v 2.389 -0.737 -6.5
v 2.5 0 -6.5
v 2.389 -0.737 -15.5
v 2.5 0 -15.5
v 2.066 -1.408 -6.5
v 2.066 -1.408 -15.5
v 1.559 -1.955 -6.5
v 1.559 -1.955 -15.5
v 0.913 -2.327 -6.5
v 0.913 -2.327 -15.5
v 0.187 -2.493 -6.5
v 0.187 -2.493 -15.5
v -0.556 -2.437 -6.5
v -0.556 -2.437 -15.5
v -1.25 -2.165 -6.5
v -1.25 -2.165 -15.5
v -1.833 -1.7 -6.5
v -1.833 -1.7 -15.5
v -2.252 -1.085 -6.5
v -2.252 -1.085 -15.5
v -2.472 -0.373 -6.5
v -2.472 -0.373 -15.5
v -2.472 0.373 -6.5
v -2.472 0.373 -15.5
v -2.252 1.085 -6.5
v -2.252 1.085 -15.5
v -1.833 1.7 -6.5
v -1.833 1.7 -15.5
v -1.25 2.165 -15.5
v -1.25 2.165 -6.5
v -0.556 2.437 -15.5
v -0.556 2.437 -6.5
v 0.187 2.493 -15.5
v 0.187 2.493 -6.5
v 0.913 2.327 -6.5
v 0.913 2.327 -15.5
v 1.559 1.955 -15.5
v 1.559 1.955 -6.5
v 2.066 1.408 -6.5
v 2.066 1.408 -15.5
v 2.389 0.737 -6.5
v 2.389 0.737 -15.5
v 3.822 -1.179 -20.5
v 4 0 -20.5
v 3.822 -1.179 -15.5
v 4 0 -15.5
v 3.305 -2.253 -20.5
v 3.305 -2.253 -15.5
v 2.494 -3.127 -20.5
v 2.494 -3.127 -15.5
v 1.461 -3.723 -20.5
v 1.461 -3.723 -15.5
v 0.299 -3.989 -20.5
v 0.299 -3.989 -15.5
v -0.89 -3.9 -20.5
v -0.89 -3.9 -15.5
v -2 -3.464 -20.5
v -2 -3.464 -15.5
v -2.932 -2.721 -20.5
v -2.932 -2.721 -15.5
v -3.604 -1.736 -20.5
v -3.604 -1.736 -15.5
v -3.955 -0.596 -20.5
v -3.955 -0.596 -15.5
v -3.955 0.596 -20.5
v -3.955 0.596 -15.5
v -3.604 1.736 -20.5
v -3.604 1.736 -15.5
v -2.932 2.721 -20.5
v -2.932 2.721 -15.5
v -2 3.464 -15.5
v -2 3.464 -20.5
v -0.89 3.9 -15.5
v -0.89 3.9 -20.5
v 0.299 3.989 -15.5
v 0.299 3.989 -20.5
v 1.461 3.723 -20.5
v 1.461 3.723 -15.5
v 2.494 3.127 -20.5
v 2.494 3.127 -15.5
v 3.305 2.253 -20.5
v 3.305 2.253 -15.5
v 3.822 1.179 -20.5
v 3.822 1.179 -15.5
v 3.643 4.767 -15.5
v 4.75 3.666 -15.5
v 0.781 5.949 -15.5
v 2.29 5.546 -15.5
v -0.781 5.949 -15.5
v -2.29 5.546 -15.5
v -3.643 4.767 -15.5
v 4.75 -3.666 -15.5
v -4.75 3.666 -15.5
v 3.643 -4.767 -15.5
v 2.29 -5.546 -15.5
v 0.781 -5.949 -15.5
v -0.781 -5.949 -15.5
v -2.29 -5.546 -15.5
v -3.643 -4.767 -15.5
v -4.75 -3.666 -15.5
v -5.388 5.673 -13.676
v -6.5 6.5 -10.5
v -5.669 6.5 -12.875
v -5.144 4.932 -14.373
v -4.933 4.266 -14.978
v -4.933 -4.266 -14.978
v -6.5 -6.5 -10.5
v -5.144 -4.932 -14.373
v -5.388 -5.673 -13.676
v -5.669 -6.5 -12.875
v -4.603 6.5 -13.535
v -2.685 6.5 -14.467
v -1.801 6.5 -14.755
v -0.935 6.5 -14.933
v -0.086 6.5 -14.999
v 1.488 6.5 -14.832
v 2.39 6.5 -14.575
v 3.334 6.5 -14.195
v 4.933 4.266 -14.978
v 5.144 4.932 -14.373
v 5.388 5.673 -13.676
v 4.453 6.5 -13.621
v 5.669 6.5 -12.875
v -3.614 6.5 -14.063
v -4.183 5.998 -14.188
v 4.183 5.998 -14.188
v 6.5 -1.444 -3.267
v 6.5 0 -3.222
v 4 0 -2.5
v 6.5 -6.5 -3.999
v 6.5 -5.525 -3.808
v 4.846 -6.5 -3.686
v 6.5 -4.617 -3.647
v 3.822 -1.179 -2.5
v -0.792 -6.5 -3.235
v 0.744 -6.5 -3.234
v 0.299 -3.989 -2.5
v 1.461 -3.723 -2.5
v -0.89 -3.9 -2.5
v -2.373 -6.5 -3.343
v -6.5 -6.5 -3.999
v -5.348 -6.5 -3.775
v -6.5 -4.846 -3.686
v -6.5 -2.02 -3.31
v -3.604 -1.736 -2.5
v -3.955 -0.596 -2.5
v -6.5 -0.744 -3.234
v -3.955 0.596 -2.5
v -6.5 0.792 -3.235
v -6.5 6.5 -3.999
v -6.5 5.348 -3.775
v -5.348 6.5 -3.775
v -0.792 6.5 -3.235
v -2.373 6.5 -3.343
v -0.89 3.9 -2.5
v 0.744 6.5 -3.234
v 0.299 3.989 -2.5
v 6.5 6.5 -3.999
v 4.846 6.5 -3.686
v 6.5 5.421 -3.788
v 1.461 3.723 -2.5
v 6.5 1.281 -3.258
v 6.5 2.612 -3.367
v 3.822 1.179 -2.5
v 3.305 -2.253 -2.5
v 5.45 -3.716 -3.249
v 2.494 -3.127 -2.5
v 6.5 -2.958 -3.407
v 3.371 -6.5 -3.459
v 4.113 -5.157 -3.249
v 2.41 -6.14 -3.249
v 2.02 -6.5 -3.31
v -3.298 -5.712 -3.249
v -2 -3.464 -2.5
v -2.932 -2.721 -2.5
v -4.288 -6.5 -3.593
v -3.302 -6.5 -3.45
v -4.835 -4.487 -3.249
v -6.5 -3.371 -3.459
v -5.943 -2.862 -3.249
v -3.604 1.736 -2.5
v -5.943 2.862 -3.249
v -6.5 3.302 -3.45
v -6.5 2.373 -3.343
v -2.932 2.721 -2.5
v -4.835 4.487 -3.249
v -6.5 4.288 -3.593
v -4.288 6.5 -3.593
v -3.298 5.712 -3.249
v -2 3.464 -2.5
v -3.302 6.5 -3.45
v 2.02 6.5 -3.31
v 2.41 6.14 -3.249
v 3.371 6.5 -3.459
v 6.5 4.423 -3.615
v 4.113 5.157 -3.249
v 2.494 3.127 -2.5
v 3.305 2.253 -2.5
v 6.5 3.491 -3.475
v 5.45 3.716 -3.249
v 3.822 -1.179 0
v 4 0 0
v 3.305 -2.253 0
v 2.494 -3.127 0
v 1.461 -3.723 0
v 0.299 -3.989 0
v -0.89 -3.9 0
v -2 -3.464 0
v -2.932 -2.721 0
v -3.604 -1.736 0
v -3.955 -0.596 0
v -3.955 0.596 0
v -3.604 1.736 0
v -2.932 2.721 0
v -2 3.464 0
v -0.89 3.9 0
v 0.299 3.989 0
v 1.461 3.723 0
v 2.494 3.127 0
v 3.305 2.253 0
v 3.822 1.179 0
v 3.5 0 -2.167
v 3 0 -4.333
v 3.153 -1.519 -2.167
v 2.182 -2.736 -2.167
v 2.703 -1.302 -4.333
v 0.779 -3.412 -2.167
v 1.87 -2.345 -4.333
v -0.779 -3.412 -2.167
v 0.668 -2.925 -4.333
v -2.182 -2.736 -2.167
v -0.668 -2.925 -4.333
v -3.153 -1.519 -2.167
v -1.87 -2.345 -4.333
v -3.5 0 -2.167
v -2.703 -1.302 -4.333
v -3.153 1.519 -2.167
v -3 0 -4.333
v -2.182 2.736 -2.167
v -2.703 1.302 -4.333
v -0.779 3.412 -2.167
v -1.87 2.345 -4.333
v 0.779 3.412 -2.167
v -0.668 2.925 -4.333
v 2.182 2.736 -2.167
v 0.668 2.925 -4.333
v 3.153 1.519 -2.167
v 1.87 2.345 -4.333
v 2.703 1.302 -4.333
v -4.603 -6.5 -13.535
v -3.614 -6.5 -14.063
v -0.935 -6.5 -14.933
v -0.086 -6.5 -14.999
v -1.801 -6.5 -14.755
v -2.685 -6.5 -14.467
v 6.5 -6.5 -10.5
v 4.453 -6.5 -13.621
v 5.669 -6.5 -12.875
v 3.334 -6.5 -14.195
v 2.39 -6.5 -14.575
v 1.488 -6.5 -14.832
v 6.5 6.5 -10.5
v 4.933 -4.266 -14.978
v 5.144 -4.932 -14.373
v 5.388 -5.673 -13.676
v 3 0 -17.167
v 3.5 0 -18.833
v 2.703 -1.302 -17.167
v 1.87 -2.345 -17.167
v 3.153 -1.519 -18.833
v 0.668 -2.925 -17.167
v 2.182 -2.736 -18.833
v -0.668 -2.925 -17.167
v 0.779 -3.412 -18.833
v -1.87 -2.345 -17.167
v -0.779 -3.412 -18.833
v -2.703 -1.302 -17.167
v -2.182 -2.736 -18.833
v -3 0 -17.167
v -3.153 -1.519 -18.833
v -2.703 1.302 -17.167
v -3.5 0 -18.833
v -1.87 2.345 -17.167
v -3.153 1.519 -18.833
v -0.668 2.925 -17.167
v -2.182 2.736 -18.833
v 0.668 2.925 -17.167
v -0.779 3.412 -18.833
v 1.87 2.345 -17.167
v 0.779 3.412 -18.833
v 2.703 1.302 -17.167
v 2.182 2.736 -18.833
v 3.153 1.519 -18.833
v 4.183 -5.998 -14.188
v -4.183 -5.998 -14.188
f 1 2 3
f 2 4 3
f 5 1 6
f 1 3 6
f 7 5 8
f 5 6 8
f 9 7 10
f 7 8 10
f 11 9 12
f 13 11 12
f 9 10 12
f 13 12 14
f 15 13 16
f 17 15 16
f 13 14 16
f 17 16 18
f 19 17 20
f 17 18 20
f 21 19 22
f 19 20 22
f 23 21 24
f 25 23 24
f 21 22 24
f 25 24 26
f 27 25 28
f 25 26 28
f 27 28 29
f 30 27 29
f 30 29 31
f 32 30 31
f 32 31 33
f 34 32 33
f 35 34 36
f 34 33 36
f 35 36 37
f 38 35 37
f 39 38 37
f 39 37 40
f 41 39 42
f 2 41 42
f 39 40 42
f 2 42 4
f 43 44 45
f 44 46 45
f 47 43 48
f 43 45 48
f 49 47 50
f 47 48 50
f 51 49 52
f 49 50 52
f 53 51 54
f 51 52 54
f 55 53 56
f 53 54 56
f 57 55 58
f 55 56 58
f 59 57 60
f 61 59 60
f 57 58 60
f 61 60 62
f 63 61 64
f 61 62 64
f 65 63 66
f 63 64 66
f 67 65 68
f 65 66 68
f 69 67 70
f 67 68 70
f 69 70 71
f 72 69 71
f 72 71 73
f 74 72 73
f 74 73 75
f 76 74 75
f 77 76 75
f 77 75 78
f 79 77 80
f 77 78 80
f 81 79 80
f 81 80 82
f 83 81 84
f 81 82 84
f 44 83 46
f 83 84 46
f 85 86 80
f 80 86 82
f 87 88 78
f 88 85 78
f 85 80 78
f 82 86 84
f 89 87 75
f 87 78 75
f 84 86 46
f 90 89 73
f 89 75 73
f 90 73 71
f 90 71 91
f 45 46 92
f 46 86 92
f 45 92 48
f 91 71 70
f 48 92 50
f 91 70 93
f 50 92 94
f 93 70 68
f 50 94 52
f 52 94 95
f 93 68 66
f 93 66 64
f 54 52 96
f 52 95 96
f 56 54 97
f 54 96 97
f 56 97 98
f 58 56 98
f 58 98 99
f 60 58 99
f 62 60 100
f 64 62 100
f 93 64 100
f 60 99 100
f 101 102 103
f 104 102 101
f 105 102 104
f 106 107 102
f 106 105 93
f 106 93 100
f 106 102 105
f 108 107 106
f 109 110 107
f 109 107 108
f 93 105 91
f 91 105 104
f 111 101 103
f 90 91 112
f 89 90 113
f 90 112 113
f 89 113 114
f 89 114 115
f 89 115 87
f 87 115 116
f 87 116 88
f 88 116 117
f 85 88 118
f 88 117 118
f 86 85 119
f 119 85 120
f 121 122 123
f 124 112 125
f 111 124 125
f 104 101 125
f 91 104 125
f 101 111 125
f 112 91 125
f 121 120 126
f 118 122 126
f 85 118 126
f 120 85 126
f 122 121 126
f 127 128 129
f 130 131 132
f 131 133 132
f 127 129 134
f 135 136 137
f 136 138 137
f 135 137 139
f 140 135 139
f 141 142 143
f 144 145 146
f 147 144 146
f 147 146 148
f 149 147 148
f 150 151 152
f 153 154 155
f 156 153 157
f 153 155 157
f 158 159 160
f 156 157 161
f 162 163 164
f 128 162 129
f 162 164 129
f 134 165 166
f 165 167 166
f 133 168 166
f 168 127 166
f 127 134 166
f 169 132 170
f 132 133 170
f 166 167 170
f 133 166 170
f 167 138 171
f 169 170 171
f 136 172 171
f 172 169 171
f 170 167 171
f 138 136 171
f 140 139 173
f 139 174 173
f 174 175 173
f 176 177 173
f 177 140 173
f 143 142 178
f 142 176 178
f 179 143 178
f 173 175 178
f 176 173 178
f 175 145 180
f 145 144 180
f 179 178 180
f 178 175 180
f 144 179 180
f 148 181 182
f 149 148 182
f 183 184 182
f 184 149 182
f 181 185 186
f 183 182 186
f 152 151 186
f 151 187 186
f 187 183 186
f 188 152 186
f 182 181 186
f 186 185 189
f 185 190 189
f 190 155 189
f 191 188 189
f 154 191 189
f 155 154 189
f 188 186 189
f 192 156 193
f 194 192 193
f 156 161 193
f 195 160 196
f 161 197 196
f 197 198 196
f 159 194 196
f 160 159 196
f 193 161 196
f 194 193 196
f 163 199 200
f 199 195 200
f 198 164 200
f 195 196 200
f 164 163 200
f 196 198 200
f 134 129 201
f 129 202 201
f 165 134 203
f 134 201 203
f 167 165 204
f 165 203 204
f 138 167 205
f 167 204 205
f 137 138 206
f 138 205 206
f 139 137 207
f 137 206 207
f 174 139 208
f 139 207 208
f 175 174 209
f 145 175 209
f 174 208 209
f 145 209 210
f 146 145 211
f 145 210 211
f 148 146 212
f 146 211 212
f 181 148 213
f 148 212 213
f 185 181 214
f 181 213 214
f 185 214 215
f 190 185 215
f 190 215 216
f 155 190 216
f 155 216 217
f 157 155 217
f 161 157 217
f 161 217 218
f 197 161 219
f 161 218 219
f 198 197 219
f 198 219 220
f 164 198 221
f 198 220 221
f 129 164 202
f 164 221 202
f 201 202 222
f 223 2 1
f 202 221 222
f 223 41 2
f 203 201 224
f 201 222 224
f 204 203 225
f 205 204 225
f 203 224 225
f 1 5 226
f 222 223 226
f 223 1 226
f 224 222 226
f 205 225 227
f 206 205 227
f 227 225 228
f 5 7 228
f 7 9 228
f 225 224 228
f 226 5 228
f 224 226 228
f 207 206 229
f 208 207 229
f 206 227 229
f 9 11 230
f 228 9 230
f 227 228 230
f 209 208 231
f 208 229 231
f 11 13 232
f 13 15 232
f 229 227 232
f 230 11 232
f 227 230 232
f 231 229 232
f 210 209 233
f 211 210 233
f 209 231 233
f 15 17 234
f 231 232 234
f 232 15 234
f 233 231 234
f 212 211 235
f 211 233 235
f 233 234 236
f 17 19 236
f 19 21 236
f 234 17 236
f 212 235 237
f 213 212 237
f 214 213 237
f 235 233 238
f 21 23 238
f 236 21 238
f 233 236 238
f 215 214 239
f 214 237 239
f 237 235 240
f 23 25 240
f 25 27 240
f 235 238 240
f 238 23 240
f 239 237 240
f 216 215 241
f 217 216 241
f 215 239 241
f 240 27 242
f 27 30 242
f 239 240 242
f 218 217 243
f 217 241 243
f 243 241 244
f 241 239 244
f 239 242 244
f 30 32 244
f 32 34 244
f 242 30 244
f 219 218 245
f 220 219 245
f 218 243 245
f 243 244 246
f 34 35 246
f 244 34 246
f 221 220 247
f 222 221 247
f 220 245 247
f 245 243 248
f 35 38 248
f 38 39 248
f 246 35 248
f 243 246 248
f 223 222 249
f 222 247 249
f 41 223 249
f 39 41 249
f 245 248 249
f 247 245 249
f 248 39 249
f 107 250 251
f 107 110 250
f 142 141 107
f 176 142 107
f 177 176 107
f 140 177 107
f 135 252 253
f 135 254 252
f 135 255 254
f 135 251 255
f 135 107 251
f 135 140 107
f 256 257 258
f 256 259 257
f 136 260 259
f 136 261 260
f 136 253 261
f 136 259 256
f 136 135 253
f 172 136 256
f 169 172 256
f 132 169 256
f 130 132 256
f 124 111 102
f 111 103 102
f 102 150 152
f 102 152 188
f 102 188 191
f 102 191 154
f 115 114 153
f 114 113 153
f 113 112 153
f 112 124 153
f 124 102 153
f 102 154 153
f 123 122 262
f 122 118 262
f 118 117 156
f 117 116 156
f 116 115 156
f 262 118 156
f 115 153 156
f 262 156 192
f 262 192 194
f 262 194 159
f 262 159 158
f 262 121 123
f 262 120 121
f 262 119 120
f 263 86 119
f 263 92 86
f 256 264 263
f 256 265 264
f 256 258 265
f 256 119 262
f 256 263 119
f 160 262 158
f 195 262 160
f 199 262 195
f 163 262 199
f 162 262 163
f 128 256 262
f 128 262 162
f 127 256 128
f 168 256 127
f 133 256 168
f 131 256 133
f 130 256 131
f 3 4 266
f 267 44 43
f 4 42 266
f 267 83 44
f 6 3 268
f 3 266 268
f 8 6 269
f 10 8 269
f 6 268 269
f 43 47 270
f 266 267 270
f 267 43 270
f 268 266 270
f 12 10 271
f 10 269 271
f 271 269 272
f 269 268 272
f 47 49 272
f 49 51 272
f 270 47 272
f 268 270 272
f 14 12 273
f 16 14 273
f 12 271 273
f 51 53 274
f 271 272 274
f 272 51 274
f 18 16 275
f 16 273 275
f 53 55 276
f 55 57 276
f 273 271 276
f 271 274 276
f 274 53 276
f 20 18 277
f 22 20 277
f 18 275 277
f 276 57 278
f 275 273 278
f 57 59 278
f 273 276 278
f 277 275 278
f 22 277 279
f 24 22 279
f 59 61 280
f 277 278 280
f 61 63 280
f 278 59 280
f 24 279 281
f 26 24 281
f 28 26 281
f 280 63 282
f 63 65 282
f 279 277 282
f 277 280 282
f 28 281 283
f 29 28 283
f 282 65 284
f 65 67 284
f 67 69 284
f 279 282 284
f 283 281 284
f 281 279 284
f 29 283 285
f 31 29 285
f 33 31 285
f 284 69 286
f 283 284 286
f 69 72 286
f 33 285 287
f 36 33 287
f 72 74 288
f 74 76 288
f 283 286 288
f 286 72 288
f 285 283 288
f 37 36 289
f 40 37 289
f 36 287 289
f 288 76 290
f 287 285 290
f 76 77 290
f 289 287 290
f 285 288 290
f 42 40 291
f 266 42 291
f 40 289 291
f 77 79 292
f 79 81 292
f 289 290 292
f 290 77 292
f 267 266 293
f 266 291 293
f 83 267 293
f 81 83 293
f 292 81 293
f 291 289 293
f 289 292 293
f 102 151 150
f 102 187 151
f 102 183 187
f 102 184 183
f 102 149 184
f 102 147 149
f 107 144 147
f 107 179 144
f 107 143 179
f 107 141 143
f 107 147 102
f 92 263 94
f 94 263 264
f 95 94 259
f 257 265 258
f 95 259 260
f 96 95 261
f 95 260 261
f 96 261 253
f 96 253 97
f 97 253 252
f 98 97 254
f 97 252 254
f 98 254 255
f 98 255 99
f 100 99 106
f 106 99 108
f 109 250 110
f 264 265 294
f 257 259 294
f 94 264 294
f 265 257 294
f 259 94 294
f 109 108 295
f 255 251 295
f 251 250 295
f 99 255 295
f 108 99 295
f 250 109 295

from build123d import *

# Parameters (mm, degrees)
F3_DEPTH = 6.5


with BuildPart() as f1:
    # F0 (on Front) → F1 (revolve)
    with BuildSketch(Plane.XZ):
        Polygon((4, -2.5), (4, 0), (2.5, -6.5), (2.5, -15.5), (4, -20.5), (4, -15.5), (6, -15.5), (15.640222, -5.859778), align=None)
    revolve(axis=Axis((0, 0, 0.112359), (0, 0, -1)))

    # F2 (on Front) → F3 (intersect, symmetric)
    with BuildSketch(Plane.XZ):
        Polygon((6.5, 0), (4, 0), (-4, 0), (-6.5, 0), (-6.5, -10.5), (-4.75, -15.5), (-4.75, -20.5), (0, -20.5), (4.75, -20.5), (4.75, -15.5), (6.5, -10.5), align=None)
    extrude(amount=F3_DEPTH, both=True, mode=Mode.INTERSECT)


solid = f1.part
